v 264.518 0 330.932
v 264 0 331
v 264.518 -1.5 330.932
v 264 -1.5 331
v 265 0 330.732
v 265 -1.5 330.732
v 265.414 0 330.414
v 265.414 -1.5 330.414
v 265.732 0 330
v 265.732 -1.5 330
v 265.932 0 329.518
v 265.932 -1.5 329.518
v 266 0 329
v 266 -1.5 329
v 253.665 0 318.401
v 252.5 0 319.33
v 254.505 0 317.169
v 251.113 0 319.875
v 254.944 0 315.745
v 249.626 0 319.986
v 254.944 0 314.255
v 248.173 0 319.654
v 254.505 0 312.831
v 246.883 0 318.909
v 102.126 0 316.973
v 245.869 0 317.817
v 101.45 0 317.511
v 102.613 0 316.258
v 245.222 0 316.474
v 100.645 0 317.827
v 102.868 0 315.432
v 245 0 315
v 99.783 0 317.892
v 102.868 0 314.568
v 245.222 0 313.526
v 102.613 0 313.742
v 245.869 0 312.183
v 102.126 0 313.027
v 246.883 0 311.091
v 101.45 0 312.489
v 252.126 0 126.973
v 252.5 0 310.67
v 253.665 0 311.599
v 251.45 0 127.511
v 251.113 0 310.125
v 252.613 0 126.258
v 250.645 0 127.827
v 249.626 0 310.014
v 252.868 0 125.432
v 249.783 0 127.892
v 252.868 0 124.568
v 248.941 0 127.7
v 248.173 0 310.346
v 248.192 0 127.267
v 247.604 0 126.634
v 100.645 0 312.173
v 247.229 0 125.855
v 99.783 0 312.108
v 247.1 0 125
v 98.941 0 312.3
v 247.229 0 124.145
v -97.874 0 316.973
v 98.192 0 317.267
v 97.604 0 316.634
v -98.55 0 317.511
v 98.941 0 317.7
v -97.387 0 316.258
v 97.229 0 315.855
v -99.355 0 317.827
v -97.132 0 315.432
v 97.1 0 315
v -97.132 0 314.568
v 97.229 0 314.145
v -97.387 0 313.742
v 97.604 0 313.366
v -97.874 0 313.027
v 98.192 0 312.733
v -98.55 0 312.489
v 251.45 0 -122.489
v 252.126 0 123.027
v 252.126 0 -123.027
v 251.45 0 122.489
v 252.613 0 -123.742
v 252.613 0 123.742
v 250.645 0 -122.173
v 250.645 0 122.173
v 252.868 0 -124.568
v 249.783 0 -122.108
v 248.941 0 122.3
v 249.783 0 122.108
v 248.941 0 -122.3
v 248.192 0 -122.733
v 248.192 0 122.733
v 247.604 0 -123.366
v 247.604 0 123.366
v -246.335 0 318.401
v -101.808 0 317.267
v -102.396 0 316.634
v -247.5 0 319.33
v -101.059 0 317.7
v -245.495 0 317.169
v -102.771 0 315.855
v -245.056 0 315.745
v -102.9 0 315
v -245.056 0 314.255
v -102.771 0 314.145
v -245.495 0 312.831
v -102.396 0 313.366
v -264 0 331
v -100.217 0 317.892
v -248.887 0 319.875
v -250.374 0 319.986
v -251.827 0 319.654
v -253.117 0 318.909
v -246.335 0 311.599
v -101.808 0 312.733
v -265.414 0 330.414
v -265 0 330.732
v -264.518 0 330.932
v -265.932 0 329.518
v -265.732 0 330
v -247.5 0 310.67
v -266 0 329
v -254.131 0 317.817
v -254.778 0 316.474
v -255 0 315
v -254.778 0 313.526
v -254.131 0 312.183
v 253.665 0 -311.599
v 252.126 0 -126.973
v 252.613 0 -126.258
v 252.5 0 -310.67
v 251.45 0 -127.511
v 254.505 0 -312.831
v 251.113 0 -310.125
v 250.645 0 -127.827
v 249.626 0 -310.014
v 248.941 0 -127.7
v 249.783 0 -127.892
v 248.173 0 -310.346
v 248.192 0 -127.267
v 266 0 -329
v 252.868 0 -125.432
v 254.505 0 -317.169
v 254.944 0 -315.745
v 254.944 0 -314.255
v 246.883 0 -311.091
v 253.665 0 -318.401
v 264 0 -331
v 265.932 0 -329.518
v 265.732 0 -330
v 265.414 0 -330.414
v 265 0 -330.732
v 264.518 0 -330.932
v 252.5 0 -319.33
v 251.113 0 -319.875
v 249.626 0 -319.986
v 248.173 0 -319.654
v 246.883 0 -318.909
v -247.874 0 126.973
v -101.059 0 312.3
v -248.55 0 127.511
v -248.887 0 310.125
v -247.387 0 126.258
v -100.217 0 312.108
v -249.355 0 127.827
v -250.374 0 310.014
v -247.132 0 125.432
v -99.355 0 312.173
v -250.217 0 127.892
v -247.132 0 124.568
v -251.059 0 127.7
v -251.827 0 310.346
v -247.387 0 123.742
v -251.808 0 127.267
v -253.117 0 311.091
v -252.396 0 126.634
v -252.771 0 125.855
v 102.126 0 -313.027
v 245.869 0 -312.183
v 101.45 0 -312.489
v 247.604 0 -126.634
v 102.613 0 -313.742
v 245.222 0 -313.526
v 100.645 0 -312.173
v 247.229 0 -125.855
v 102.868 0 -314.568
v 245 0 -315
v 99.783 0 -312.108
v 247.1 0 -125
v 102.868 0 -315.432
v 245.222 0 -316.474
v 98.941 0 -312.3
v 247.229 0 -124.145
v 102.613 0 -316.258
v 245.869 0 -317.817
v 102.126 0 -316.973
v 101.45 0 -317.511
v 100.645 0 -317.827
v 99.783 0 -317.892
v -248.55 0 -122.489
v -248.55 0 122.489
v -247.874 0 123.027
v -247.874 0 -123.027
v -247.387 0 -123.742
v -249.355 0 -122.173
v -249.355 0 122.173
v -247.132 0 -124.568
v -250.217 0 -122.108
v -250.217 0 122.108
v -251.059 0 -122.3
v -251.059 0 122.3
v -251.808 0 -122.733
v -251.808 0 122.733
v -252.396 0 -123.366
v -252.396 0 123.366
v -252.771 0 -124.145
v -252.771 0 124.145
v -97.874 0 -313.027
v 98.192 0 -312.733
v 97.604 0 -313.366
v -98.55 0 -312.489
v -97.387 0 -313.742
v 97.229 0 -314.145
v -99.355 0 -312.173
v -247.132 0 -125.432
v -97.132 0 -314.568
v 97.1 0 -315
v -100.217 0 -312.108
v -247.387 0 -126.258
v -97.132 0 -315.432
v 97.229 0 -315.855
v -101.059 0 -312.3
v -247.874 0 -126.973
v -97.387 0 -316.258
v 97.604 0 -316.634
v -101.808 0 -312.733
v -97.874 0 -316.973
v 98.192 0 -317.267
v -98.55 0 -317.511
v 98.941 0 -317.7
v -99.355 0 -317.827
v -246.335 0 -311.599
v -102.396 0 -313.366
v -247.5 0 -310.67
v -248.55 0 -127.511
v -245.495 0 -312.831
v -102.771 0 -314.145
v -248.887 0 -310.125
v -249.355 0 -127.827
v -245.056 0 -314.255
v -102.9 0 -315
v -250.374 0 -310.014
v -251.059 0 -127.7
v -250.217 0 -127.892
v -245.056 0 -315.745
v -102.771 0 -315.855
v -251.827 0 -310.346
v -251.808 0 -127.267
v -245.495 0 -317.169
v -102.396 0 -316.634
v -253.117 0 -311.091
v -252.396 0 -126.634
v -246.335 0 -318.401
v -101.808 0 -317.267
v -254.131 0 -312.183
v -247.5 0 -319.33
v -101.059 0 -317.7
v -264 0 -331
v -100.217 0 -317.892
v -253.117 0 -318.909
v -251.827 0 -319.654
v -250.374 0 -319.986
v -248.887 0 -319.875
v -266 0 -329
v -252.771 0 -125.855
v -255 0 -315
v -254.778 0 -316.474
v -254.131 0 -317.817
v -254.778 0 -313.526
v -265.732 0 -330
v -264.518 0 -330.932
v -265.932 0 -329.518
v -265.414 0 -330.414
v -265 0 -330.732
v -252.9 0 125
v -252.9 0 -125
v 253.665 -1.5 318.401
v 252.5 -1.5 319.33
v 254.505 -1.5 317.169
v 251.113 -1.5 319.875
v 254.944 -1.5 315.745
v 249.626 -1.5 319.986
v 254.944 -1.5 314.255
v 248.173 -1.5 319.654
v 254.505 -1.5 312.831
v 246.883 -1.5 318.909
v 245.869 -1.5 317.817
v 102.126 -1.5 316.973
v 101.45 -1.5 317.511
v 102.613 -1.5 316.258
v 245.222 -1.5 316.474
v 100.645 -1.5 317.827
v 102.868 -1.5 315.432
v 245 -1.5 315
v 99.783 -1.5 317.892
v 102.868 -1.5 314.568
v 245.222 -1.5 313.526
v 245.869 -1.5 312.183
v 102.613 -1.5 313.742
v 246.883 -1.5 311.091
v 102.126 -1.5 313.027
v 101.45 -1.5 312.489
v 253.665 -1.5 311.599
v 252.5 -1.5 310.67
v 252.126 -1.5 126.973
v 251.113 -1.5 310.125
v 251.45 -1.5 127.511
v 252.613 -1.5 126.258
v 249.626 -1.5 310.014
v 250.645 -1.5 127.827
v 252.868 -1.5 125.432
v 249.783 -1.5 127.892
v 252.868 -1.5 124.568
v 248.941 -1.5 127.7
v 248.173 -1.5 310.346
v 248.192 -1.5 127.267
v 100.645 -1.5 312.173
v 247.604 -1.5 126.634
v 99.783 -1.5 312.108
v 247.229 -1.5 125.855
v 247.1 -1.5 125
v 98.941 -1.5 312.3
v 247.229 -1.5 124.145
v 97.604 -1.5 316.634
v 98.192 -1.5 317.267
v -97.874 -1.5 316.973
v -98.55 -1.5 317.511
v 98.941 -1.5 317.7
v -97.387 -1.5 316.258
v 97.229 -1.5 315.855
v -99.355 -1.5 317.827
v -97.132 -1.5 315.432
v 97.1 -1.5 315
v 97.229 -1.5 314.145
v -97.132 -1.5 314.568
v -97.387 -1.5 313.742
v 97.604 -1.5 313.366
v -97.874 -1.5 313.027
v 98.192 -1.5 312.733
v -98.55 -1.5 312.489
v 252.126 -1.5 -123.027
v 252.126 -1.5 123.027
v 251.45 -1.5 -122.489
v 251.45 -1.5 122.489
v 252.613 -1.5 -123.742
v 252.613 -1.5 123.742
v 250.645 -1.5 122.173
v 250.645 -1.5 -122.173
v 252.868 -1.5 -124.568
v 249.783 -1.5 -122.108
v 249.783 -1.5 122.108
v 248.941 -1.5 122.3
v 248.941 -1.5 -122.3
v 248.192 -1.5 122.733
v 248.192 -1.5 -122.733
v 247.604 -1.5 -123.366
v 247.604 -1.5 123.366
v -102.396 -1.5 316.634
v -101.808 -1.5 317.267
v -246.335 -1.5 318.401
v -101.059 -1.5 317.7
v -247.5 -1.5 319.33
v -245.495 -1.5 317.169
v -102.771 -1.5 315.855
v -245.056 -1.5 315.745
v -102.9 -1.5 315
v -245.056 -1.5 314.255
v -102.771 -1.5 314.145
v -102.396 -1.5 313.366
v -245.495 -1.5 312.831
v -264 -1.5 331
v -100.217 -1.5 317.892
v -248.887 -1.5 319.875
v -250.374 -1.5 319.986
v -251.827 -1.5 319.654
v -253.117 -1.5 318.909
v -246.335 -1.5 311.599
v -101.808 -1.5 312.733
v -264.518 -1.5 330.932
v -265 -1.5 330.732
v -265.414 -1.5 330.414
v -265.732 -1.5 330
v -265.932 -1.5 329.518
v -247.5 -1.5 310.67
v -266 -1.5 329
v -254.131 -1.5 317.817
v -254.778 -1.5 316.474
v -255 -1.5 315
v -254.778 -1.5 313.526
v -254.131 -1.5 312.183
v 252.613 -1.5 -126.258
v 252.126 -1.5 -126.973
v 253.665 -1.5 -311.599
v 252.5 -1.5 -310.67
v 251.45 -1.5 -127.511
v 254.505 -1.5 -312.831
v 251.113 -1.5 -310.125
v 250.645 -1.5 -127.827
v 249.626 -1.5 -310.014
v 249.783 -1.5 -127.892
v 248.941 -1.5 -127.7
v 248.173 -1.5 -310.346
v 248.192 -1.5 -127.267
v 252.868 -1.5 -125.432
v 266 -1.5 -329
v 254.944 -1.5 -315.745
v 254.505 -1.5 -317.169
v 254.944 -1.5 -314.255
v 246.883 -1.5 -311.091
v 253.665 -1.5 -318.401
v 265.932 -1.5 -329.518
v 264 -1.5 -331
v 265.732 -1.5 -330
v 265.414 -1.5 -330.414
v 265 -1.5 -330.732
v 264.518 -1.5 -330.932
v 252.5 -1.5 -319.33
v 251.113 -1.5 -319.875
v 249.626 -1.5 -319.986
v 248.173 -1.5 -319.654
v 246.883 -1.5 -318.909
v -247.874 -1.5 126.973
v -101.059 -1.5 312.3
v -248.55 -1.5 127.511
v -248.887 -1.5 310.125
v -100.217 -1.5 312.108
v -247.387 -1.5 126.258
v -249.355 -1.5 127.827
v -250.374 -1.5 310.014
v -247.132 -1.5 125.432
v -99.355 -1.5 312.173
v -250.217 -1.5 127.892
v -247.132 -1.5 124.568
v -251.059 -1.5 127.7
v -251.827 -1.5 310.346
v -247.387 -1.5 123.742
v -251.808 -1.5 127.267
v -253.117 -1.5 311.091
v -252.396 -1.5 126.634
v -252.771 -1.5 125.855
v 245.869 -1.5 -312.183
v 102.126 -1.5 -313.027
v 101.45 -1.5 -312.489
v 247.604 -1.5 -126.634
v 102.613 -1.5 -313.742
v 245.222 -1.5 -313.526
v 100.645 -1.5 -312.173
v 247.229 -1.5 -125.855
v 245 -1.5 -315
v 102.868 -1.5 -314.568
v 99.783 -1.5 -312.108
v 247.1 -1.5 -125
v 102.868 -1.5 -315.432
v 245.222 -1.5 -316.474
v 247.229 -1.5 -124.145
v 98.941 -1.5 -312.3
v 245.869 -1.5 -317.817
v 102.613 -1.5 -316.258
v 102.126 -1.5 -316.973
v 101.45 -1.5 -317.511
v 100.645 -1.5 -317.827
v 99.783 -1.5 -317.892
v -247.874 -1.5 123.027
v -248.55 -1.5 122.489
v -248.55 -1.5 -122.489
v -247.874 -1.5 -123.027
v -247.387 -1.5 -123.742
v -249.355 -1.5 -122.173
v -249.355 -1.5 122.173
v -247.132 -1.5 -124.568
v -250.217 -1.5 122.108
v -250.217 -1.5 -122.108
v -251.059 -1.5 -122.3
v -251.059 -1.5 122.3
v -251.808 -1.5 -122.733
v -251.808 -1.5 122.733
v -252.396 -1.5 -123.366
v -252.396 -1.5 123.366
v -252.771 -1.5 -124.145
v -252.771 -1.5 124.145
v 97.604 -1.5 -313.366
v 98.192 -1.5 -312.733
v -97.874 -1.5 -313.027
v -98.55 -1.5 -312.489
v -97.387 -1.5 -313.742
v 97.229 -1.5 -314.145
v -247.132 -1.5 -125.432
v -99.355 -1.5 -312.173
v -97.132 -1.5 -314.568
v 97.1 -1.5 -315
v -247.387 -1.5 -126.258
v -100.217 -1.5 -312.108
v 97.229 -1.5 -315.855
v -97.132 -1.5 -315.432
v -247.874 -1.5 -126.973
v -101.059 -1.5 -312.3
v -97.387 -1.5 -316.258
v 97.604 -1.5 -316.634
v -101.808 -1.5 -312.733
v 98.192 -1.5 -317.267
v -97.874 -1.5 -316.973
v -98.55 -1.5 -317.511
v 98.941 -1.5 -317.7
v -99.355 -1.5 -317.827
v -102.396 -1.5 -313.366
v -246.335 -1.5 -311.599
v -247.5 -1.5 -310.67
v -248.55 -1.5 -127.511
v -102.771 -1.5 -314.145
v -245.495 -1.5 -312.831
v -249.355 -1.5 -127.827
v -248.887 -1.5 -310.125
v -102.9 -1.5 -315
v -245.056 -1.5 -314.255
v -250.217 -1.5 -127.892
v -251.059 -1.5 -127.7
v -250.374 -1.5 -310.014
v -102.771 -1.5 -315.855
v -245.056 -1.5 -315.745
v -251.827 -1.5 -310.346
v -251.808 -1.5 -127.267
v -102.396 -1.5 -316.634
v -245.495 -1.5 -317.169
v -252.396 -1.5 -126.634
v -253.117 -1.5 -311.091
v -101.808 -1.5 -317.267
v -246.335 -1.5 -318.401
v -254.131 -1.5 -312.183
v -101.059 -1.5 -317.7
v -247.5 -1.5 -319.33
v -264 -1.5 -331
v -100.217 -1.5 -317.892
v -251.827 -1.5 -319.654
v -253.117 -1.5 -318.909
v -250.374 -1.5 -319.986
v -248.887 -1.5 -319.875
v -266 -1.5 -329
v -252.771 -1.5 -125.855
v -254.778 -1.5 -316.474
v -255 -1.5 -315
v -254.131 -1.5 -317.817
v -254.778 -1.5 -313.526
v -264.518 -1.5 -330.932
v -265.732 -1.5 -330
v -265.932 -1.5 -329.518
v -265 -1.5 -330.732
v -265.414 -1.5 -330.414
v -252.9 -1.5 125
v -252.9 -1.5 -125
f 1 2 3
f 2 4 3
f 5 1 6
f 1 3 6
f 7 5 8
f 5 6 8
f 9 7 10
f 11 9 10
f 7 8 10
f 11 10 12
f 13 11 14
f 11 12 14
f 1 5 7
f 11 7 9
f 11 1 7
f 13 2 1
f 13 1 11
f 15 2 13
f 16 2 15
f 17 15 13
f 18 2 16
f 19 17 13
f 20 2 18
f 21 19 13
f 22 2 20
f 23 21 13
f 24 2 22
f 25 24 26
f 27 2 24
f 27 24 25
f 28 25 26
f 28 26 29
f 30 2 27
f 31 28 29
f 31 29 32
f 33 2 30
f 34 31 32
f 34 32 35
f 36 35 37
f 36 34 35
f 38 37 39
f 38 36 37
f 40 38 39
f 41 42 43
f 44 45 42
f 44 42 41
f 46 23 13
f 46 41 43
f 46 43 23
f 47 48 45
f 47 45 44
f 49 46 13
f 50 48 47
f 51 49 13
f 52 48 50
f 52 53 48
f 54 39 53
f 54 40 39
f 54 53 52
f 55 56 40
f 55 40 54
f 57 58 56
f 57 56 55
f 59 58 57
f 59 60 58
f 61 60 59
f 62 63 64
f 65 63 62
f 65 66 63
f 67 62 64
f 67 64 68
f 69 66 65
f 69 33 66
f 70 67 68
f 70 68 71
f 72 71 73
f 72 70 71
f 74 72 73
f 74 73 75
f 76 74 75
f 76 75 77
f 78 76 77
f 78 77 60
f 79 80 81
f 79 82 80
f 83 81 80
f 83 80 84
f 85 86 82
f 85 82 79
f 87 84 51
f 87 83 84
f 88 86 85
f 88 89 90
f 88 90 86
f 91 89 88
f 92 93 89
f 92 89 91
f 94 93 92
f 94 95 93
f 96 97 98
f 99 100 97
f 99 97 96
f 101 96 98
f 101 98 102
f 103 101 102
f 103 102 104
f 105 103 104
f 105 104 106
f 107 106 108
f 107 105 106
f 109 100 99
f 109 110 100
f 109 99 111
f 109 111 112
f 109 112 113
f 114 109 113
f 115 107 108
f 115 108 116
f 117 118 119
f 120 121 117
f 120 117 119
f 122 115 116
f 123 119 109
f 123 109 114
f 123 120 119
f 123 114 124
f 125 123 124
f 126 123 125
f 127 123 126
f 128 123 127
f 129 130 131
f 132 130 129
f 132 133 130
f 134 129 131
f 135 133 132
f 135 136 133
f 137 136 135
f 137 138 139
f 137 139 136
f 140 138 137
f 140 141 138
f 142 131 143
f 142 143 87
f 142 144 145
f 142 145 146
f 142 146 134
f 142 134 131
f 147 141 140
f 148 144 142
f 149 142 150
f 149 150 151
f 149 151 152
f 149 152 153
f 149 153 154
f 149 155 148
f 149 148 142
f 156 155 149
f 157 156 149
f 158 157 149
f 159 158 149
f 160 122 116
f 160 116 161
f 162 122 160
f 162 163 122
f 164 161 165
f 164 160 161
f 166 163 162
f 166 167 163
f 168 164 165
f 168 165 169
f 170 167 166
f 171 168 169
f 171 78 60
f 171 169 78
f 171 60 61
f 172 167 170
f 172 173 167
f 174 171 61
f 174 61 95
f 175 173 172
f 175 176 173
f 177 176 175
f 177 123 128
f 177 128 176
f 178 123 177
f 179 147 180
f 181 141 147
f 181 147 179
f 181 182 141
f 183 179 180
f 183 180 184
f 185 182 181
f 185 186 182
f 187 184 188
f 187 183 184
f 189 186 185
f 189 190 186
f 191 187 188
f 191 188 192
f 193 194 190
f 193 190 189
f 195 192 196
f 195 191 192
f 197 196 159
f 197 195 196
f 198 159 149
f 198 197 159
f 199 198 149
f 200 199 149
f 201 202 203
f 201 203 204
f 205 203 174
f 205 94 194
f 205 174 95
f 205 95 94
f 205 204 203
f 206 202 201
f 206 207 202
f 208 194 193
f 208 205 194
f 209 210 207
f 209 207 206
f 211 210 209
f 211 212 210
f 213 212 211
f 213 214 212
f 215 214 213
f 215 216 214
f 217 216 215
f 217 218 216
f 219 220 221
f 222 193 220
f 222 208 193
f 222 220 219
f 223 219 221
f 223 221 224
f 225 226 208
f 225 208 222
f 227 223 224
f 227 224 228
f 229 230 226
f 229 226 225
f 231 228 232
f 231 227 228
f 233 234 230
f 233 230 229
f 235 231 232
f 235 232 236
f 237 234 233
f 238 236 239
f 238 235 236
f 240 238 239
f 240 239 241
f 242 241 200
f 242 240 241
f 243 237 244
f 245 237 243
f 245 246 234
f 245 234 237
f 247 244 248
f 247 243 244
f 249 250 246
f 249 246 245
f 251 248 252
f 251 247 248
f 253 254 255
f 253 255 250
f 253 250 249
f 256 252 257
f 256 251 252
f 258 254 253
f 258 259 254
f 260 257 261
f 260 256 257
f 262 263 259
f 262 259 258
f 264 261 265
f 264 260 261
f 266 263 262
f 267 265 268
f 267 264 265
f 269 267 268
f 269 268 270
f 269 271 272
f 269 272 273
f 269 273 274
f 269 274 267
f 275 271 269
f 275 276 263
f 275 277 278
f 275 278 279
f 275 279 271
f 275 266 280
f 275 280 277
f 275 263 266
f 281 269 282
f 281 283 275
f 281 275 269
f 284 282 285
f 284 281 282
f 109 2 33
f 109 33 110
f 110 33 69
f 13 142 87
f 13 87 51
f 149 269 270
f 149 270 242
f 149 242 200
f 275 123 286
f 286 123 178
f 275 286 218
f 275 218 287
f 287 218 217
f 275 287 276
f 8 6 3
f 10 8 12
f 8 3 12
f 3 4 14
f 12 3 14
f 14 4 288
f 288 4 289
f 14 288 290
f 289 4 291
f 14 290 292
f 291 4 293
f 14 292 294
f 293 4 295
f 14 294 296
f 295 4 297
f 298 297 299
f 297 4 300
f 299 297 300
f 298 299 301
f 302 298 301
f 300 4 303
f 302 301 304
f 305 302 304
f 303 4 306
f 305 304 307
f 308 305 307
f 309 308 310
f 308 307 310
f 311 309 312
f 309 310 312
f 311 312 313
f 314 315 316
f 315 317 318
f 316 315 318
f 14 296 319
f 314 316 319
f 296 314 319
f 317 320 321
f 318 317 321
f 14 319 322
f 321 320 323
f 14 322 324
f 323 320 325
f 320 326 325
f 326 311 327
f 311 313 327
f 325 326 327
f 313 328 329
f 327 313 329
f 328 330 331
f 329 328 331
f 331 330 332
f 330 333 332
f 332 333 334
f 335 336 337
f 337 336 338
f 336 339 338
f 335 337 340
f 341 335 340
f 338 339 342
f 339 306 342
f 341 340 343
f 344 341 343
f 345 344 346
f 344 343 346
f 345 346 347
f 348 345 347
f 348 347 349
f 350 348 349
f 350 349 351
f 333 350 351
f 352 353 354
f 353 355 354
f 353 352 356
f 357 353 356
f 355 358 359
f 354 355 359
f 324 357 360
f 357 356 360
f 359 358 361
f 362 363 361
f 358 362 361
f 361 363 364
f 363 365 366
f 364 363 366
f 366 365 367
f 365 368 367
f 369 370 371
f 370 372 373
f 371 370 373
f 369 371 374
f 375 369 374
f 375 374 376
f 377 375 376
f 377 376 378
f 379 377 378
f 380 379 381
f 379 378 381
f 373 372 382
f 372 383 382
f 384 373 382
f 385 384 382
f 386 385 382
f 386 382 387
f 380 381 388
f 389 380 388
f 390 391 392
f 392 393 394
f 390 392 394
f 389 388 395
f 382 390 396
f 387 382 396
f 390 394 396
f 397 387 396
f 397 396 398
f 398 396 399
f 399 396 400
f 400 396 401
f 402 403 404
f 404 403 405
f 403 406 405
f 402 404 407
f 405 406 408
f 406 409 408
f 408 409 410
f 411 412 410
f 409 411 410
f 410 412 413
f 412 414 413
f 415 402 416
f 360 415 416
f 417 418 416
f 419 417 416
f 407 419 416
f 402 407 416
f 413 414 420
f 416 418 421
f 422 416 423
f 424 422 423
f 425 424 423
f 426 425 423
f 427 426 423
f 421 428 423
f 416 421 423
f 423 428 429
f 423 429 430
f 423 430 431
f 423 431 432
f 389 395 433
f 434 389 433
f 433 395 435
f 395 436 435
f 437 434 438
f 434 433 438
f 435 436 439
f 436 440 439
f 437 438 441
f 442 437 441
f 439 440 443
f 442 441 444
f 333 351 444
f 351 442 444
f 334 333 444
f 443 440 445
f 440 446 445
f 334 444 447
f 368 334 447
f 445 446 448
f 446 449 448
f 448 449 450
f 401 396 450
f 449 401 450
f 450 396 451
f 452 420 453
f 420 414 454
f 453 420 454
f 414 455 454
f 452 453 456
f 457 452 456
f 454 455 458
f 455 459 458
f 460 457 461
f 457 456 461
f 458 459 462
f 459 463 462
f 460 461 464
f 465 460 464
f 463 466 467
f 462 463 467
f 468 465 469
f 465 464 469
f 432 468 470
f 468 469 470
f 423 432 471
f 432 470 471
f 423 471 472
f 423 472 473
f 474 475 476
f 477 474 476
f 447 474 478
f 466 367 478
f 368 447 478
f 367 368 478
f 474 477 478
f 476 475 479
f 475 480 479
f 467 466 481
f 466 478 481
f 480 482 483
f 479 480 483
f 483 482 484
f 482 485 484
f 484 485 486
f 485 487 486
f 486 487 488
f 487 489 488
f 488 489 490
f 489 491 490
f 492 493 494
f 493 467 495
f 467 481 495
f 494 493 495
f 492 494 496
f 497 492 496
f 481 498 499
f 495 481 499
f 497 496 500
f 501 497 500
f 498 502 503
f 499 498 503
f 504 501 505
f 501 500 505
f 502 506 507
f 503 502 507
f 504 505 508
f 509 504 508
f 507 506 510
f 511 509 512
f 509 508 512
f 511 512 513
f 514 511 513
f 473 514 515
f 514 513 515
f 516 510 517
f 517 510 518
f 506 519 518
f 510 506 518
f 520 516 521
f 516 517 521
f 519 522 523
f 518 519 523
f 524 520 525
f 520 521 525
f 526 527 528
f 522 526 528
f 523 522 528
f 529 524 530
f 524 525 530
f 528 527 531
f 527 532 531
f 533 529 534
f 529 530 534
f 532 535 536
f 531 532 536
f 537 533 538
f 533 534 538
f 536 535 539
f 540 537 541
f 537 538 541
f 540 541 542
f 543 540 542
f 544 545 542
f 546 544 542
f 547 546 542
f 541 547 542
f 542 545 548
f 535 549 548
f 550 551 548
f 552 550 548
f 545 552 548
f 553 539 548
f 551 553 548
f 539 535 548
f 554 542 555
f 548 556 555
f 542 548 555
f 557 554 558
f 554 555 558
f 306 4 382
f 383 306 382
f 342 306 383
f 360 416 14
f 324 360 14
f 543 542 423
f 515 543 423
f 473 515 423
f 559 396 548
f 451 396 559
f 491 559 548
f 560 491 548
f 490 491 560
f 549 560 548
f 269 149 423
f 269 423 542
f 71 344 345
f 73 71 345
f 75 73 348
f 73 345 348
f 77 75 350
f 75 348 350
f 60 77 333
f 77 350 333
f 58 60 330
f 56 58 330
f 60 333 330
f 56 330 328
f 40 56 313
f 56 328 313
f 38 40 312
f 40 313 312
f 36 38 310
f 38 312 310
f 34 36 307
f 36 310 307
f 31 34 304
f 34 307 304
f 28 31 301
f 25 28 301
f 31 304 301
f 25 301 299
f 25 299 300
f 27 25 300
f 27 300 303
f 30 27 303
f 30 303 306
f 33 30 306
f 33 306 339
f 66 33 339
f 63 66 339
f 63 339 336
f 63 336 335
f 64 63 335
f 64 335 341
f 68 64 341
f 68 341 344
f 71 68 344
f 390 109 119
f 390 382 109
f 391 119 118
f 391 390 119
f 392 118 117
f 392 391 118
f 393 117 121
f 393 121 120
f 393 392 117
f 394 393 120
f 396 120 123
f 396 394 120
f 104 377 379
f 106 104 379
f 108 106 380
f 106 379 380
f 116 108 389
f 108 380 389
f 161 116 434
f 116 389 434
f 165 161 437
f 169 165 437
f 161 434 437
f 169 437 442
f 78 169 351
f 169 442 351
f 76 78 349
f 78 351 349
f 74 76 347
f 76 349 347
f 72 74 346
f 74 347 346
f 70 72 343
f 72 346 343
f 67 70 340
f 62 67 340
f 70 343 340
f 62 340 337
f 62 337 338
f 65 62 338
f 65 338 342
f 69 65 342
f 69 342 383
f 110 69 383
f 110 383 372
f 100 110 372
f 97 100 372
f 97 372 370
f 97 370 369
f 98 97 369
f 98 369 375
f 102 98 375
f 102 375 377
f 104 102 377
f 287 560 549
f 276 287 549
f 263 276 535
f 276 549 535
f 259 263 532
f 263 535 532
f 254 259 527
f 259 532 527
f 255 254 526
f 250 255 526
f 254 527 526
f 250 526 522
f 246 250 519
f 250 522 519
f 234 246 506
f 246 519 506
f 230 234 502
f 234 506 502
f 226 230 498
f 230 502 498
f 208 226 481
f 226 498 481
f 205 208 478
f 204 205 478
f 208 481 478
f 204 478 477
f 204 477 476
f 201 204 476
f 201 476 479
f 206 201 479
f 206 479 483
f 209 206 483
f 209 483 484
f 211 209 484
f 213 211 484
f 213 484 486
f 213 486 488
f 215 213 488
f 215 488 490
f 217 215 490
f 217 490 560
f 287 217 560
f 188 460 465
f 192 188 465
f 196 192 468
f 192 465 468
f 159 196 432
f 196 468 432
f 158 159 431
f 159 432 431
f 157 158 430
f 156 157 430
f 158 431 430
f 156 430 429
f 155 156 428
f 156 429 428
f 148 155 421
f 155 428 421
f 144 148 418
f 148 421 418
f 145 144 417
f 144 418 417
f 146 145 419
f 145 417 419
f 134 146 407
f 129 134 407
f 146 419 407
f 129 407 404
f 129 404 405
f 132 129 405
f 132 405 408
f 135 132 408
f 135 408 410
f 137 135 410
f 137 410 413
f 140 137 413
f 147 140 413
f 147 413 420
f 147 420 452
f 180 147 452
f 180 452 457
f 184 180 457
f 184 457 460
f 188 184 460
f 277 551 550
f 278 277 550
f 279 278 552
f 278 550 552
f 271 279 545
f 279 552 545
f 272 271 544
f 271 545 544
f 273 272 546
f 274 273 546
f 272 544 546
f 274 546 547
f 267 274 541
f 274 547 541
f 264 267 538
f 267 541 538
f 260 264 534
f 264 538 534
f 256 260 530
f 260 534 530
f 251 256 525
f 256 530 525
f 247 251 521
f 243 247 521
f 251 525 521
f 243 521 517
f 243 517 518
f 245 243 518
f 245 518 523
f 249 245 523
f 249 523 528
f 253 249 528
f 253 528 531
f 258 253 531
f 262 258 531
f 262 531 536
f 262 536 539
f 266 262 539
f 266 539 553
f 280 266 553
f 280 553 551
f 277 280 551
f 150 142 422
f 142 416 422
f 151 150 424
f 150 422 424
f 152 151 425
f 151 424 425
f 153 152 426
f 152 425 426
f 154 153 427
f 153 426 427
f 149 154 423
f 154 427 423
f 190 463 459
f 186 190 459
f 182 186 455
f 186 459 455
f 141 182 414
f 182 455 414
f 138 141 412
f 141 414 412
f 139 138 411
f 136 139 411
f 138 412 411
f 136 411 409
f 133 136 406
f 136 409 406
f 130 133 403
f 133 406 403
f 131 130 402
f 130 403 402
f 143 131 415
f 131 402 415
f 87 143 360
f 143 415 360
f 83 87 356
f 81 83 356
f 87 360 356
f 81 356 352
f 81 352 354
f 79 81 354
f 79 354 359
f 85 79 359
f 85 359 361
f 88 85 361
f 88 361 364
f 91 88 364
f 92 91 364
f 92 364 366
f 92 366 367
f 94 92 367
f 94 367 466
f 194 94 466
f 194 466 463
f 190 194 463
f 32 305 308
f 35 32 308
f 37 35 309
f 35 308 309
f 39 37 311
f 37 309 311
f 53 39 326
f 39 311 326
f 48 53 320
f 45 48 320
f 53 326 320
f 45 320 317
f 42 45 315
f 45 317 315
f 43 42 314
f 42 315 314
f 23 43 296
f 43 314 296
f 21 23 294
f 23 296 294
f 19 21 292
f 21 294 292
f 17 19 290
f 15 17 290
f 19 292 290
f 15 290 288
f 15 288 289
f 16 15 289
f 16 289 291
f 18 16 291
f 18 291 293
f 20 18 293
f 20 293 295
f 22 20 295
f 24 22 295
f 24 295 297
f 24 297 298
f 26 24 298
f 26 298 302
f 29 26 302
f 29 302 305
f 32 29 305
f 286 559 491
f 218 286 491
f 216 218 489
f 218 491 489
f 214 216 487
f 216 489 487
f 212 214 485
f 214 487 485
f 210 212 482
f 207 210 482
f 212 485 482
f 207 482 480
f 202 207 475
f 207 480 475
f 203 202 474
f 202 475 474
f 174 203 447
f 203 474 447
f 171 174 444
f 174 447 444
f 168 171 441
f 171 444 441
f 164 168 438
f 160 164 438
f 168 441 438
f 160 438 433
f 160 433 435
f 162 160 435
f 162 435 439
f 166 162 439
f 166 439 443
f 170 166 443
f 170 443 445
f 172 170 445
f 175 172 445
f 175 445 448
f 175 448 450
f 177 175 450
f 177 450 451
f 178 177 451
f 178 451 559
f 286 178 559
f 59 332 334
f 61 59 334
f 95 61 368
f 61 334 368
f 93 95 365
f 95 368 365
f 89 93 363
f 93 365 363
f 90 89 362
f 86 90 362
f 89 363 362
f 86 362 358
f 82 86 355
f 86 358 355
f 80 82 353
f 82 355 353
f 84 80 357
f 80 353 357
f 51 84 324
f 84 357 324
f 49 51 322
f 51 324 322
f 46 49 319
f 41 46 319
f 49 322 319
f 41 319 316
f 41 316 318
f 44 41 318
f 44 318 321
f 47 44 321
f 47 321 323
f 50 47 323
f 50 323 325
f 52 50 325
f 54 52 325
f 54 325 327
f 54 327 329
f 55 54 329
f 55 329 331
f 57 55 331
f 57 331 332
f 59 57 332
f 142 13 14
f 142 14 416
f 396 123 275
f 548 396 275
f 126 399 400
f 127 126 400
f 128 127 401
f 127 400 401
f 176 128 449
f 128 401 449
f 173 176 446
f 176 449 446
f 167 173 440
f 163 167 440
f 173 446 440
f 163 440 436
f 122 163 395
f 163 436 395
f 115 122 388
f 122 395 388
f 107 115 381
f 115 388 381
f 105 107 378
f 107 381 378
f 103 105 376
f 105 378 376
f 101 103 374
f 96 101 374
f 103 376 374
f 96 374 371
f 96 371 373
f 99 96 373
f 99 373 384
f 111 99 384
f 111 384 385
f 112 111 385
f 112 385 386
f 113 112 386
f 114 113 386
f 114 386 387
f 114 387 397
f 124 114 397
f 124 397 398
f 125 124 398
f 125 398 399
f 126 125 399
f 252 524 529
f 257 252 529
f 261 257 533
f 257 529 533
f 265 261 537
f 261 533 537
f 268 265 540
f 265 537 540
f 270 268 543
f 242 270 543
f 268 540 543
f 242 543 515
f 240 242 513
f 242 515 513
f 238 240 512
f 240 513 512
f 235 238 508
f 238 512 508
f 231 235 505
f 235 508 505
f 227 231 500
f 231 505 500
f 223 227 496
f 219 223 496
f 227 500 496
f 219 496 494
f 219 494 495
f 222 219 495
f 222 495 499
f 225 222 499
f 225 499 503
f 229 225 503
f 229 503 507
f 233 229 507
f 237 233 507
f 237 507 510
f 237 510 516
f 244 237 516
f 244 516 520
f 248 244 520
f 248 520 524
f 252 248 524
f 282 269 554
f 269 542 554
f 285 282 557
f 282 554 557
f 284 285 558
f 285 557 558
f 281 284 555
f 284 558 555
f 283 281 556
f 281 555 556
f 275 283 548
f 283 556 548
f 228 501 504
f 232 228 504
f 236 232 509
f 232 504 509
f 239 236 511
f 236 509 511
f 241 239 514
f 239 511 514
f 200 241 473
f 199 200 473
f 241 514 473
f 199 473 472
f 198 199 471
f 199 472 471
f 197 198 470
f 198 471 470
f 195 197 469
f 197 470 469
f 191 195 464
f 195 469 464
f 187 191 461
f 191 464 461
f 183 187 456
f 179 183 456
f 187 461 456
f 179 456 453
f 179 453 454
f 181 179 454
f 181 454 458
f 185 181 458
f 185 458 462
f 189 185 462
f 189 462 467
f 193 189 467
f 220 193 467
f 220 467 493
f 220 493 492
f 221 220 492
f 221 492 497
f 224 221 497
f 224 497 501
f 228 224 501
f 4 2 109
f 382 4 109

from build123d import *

# Parameters (mm, degrees)
SKETCH1_W            = 662
SKETCH1_H            = 532
BASE_FLANGE1_DEPTH   = 1.5
FILLET1_R            = 2
M8_CLEARANCE_HOLE1_D = 10
M5_CLEARANCE_HOLE1_D = 5.8


# Sheet-metal steps are written as plain solids
with BuildPart() as part:
    # Sketch1 → Base-Flange1 (new body)
    with BuildSketch(Plane(origin=(0, 0, 0), x_dir=(0, 0, -1), z_dir=(0, 1, 0))):
        Rectangle(SKETCH1_W, SKETCH1_H)
    extrude(amount=-BASE_FLANGE1_DEPTH)

    # Fillet1
    fillet1_edges = [part.edges().sort_by_distance(p)[0] for p in [
        (-266, -0.75, 331),
        (-266, -0.75, -331),
        (266, -0.75, -331),
        (266, -0.75, 331),
    ]]
    fillet(fillet1_edges, radius=FILLET1_R)

    # M8 Clearance Hole1 (through all)
    with Locations(Plane(origin=(0, 0, 0), x_dir=(1, 0, 0), z_dir=(0, 1, 0))):
        with Locations((-250, -315), (250, -315), (250, 315), (-250, 315)):
            Hole(M8_CLEARANCE_HOLE1_D / 2)

    # M5 Clearance Hole1 (through all)
    with Locations(Plane(origin=(0, 0, 0), x_dir=(1, 0, 0), z_dir=(0, 1, 0))):
        with Locations((100, 315), (-100, 315), (-250, 125), (-250, -125), (-100, -315), (100, -315), (250, -125), (250, 125)):
            Hole(M5_CLEARANCE_HOLE1_D / 2)


solid = part.part
